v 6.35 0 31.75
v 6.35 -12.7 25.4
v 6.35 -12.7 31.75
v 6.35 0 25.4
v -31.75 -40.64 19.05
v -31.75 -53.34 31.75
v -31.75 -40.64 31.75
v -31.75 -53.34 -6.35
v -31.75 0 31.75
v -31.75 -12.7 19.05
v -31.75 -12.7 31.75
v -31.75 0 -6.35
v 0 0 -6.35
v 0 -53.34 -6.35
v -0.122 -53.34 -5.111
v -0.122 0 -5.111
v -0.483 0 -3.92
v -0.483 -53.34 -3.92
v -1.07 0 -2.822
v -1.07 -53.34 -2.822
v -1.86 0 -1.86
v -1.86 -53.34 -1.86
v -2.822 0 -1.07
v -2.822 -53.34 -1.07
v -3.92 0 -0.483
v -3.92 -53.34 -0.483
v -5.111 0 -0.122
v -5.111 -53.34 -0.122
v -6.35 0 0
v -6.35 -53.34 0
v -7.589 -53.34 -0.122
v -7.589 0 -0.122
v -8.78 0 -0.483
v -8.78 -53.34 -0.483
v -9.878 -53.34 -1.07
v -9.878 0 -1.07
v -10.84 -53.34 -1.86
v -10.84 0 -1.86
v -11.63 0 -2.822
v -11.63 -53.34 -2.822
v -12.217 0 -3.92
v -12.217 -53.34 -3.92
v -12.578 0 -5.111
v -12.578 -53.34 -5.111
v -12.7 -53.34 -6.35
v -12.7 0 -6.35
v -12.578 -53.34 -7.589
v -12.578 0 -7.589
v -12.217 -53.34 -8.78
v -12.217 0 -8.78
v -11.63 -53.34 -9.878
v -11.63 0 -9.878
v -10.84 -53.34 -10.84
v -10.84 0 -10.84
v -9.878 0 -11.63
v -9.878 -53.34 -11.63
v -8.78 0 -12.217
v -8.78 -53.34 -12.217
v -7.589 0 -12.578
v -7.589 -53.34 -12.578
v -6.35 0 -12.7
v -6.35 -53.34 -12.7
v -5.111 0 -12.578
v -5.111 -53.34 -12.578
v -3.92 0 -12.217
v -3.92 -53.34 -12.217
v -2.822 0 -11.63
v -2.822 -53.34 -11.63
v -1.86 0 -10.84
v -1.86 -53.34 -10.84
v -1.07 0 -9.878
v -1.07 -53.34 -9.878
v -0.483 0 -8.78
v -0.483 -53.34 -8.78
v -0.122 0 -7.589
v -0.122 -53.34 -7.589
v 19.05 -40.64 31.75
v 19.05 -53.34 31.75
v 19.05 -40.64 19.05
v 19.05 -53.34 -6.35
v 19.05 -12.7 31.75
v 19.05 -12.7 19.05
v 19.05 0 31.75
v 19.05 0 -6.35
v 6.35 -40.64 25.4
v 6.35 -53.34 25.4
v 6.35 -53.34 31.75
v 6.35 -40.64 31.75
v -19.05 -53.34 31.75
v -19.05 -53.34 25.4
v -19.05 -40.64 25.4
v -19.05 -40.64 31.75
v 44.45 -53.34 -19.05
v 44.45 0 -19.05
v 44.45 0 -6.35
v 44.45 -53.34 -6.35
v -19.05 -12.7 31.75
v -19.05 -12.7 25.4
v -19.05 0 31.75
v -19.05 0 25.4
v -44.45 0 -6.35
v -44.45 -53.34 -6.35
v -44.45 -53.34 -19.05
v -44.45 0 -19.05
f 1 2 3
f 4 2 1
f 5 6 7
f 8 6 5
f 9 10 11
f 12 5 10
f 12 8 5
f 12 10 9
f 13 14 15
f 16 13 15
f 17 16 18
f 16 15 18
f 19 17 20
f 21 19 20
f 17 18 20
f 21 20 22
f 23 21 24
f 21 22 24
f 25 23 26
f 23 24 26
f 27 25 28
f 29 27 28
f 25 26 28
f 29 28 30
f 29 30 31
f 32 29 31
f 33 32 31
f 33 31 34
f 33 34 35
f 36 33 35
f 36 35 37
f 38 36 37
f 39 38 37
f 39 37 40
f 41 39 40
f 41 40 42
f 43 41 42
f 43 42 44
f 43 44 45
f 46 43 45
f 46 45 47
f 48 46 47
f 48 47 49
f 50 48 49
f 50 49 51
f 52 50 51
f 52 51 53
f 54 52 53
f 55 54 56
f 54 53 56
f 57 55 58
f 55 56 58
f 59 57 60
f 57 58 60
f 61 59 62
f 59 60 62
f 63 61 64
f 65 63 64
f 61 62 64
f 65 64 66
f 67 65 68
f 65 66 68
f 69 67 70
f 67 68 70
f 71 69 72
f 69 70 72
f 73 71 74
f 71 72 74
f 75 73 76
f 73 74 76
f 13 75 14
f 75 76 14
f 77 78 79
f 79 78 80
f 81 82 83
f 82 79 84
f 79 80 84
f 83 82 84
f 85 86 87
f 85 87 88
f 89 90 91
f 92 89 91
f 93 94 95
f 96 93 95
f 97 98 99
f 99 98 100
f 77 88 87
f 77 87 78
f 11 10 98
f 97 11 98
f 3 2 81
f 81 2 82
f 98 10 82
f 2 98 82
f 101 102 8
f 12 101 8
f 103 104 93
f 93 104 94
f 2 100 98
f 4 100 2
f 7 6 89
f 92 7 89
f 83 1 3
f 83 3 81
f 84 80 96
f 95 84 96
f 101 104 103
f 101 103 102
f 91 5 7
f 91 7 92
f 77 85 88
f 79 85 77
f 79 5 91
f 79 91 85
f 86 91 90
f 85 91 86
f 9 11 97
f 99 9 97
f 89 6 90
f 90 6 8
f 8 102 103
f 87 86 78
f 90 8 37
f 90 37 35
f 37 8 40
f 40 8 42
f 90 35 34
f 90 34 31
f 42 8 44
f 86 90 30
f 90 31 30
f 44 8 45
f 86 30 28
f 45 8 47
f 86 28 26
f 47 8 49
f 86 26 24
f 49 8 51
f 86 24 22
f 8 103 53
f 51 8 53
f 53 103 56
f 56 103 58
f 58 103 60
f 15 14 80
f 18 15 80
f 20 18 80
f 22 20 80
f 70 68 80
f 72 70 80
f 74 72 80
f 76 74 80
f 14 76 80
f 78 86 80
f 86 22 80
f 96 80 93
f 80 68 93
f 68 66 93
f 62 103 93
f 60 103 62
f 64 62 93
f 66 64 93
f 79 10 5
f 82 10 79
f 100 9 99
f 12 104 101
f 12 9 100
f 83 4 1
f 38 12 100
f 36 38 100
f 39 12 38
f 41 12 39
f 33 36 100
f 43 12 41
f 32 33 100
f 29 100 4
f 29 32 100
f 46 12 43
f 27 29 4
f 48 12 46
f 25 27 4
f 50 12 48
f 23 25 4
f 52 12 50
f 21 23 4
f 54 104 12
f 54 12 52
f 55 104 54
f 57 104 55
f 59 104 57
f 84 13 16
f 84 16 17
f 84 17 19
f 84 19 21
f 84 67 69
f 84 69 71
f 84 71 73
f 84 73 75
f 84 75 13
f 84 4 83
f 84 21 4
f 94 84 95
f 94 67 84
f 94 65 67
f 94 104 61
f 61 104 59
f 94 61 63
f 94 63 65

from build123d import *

# Parameters (mm, degrees)
F0_W      = 88.9
F0_H      = 38.1
F1_DEPTH  = 53.34
F2_W      = 12.7
F2_H      = 25.4
F3_DEPTH  = 53.341
F4_W      = 25.4
F4_H      = 25.4
F5_DEPTH  = 53.341
F6_W      = 50.8
F6_H      = 12.7
F7_DEPTH  = 6.35
F9_W      = 12.7
F9_H      = 12.7
F8_W      = 12.7
F8_H      = 12.7
F10_DEPTH = 6.35
F11_R     = 6.35
F12_DEPTH = 53.341


with BuildPart() as f1:
    # F0 (on Front) → F1 (new body)
    with BuildSketch(Plane.XZ):
        Rectangle(F0_W, F0_H)
    extrude(amount=F1_DEPTH)

    # F2 (on face) → F3 (cut, through all)
    with BuildSketch(Plane.XZ.offset(53.34)):
        with Locations((-38.1, 6.35)):
            Rectangle(F2_W, F2_H)
    extrude(amount=-F3_DEPTH, mode=Mode.SUBTRACT)

    # F4 (on face) → F5 (cut, through all)
    with BuildSketch(Plane.XZ.offset(53.34)):
        with Locations((31.75, 6.35)):
            Rectangle(F4_W, F4_H)
    extrude(amount=-F5_DEPTH, mode=Mode.SUBTRACT)

    # F6 (on face) → F7 (join)
    with BuildSketch(Plane.XY.offset(19.05)):
        with Locations((-6.35, -6.35)):
            Rectangle(F6_W, F6_H)
        with Locations((-6.35, -46.99)):
            Rectangle(F6_W, F6_H)
    extrude(amount=F7_DEPTH)

    # F9 (on face) + F8 (on face) → F10 (join)
    with BuildSketch(Plane.XY.offset(25.4)):
        with Locations((-25.4, -46.99)):
            Rectangle(F9_W, F9_H)
        with Locations((12.7, -46.99)):
            Rectangle(F9_W, F9_H)
    with BuildSketch(Plane.XY.offset(25.4)):
        with Locations((-25.4, -6.35)):
            Rectangle(F8_W, F8_H)
        with Locations((12.7, -6.35)):
            Rectangle(F8_W, F8_H)
    extrude(amount=F10_DEPTH)

    # F11 (on face) → F12 (cut, through all)
    with BuildSketch(Plane.XZ.offset(53.34)):
        with Locations((-6.35, -6.35)):
            Circle(F11_R)
    extrude(amount=-F12_DEPTH, mode=Mode.SUBTRACT)


solid = f1.part
